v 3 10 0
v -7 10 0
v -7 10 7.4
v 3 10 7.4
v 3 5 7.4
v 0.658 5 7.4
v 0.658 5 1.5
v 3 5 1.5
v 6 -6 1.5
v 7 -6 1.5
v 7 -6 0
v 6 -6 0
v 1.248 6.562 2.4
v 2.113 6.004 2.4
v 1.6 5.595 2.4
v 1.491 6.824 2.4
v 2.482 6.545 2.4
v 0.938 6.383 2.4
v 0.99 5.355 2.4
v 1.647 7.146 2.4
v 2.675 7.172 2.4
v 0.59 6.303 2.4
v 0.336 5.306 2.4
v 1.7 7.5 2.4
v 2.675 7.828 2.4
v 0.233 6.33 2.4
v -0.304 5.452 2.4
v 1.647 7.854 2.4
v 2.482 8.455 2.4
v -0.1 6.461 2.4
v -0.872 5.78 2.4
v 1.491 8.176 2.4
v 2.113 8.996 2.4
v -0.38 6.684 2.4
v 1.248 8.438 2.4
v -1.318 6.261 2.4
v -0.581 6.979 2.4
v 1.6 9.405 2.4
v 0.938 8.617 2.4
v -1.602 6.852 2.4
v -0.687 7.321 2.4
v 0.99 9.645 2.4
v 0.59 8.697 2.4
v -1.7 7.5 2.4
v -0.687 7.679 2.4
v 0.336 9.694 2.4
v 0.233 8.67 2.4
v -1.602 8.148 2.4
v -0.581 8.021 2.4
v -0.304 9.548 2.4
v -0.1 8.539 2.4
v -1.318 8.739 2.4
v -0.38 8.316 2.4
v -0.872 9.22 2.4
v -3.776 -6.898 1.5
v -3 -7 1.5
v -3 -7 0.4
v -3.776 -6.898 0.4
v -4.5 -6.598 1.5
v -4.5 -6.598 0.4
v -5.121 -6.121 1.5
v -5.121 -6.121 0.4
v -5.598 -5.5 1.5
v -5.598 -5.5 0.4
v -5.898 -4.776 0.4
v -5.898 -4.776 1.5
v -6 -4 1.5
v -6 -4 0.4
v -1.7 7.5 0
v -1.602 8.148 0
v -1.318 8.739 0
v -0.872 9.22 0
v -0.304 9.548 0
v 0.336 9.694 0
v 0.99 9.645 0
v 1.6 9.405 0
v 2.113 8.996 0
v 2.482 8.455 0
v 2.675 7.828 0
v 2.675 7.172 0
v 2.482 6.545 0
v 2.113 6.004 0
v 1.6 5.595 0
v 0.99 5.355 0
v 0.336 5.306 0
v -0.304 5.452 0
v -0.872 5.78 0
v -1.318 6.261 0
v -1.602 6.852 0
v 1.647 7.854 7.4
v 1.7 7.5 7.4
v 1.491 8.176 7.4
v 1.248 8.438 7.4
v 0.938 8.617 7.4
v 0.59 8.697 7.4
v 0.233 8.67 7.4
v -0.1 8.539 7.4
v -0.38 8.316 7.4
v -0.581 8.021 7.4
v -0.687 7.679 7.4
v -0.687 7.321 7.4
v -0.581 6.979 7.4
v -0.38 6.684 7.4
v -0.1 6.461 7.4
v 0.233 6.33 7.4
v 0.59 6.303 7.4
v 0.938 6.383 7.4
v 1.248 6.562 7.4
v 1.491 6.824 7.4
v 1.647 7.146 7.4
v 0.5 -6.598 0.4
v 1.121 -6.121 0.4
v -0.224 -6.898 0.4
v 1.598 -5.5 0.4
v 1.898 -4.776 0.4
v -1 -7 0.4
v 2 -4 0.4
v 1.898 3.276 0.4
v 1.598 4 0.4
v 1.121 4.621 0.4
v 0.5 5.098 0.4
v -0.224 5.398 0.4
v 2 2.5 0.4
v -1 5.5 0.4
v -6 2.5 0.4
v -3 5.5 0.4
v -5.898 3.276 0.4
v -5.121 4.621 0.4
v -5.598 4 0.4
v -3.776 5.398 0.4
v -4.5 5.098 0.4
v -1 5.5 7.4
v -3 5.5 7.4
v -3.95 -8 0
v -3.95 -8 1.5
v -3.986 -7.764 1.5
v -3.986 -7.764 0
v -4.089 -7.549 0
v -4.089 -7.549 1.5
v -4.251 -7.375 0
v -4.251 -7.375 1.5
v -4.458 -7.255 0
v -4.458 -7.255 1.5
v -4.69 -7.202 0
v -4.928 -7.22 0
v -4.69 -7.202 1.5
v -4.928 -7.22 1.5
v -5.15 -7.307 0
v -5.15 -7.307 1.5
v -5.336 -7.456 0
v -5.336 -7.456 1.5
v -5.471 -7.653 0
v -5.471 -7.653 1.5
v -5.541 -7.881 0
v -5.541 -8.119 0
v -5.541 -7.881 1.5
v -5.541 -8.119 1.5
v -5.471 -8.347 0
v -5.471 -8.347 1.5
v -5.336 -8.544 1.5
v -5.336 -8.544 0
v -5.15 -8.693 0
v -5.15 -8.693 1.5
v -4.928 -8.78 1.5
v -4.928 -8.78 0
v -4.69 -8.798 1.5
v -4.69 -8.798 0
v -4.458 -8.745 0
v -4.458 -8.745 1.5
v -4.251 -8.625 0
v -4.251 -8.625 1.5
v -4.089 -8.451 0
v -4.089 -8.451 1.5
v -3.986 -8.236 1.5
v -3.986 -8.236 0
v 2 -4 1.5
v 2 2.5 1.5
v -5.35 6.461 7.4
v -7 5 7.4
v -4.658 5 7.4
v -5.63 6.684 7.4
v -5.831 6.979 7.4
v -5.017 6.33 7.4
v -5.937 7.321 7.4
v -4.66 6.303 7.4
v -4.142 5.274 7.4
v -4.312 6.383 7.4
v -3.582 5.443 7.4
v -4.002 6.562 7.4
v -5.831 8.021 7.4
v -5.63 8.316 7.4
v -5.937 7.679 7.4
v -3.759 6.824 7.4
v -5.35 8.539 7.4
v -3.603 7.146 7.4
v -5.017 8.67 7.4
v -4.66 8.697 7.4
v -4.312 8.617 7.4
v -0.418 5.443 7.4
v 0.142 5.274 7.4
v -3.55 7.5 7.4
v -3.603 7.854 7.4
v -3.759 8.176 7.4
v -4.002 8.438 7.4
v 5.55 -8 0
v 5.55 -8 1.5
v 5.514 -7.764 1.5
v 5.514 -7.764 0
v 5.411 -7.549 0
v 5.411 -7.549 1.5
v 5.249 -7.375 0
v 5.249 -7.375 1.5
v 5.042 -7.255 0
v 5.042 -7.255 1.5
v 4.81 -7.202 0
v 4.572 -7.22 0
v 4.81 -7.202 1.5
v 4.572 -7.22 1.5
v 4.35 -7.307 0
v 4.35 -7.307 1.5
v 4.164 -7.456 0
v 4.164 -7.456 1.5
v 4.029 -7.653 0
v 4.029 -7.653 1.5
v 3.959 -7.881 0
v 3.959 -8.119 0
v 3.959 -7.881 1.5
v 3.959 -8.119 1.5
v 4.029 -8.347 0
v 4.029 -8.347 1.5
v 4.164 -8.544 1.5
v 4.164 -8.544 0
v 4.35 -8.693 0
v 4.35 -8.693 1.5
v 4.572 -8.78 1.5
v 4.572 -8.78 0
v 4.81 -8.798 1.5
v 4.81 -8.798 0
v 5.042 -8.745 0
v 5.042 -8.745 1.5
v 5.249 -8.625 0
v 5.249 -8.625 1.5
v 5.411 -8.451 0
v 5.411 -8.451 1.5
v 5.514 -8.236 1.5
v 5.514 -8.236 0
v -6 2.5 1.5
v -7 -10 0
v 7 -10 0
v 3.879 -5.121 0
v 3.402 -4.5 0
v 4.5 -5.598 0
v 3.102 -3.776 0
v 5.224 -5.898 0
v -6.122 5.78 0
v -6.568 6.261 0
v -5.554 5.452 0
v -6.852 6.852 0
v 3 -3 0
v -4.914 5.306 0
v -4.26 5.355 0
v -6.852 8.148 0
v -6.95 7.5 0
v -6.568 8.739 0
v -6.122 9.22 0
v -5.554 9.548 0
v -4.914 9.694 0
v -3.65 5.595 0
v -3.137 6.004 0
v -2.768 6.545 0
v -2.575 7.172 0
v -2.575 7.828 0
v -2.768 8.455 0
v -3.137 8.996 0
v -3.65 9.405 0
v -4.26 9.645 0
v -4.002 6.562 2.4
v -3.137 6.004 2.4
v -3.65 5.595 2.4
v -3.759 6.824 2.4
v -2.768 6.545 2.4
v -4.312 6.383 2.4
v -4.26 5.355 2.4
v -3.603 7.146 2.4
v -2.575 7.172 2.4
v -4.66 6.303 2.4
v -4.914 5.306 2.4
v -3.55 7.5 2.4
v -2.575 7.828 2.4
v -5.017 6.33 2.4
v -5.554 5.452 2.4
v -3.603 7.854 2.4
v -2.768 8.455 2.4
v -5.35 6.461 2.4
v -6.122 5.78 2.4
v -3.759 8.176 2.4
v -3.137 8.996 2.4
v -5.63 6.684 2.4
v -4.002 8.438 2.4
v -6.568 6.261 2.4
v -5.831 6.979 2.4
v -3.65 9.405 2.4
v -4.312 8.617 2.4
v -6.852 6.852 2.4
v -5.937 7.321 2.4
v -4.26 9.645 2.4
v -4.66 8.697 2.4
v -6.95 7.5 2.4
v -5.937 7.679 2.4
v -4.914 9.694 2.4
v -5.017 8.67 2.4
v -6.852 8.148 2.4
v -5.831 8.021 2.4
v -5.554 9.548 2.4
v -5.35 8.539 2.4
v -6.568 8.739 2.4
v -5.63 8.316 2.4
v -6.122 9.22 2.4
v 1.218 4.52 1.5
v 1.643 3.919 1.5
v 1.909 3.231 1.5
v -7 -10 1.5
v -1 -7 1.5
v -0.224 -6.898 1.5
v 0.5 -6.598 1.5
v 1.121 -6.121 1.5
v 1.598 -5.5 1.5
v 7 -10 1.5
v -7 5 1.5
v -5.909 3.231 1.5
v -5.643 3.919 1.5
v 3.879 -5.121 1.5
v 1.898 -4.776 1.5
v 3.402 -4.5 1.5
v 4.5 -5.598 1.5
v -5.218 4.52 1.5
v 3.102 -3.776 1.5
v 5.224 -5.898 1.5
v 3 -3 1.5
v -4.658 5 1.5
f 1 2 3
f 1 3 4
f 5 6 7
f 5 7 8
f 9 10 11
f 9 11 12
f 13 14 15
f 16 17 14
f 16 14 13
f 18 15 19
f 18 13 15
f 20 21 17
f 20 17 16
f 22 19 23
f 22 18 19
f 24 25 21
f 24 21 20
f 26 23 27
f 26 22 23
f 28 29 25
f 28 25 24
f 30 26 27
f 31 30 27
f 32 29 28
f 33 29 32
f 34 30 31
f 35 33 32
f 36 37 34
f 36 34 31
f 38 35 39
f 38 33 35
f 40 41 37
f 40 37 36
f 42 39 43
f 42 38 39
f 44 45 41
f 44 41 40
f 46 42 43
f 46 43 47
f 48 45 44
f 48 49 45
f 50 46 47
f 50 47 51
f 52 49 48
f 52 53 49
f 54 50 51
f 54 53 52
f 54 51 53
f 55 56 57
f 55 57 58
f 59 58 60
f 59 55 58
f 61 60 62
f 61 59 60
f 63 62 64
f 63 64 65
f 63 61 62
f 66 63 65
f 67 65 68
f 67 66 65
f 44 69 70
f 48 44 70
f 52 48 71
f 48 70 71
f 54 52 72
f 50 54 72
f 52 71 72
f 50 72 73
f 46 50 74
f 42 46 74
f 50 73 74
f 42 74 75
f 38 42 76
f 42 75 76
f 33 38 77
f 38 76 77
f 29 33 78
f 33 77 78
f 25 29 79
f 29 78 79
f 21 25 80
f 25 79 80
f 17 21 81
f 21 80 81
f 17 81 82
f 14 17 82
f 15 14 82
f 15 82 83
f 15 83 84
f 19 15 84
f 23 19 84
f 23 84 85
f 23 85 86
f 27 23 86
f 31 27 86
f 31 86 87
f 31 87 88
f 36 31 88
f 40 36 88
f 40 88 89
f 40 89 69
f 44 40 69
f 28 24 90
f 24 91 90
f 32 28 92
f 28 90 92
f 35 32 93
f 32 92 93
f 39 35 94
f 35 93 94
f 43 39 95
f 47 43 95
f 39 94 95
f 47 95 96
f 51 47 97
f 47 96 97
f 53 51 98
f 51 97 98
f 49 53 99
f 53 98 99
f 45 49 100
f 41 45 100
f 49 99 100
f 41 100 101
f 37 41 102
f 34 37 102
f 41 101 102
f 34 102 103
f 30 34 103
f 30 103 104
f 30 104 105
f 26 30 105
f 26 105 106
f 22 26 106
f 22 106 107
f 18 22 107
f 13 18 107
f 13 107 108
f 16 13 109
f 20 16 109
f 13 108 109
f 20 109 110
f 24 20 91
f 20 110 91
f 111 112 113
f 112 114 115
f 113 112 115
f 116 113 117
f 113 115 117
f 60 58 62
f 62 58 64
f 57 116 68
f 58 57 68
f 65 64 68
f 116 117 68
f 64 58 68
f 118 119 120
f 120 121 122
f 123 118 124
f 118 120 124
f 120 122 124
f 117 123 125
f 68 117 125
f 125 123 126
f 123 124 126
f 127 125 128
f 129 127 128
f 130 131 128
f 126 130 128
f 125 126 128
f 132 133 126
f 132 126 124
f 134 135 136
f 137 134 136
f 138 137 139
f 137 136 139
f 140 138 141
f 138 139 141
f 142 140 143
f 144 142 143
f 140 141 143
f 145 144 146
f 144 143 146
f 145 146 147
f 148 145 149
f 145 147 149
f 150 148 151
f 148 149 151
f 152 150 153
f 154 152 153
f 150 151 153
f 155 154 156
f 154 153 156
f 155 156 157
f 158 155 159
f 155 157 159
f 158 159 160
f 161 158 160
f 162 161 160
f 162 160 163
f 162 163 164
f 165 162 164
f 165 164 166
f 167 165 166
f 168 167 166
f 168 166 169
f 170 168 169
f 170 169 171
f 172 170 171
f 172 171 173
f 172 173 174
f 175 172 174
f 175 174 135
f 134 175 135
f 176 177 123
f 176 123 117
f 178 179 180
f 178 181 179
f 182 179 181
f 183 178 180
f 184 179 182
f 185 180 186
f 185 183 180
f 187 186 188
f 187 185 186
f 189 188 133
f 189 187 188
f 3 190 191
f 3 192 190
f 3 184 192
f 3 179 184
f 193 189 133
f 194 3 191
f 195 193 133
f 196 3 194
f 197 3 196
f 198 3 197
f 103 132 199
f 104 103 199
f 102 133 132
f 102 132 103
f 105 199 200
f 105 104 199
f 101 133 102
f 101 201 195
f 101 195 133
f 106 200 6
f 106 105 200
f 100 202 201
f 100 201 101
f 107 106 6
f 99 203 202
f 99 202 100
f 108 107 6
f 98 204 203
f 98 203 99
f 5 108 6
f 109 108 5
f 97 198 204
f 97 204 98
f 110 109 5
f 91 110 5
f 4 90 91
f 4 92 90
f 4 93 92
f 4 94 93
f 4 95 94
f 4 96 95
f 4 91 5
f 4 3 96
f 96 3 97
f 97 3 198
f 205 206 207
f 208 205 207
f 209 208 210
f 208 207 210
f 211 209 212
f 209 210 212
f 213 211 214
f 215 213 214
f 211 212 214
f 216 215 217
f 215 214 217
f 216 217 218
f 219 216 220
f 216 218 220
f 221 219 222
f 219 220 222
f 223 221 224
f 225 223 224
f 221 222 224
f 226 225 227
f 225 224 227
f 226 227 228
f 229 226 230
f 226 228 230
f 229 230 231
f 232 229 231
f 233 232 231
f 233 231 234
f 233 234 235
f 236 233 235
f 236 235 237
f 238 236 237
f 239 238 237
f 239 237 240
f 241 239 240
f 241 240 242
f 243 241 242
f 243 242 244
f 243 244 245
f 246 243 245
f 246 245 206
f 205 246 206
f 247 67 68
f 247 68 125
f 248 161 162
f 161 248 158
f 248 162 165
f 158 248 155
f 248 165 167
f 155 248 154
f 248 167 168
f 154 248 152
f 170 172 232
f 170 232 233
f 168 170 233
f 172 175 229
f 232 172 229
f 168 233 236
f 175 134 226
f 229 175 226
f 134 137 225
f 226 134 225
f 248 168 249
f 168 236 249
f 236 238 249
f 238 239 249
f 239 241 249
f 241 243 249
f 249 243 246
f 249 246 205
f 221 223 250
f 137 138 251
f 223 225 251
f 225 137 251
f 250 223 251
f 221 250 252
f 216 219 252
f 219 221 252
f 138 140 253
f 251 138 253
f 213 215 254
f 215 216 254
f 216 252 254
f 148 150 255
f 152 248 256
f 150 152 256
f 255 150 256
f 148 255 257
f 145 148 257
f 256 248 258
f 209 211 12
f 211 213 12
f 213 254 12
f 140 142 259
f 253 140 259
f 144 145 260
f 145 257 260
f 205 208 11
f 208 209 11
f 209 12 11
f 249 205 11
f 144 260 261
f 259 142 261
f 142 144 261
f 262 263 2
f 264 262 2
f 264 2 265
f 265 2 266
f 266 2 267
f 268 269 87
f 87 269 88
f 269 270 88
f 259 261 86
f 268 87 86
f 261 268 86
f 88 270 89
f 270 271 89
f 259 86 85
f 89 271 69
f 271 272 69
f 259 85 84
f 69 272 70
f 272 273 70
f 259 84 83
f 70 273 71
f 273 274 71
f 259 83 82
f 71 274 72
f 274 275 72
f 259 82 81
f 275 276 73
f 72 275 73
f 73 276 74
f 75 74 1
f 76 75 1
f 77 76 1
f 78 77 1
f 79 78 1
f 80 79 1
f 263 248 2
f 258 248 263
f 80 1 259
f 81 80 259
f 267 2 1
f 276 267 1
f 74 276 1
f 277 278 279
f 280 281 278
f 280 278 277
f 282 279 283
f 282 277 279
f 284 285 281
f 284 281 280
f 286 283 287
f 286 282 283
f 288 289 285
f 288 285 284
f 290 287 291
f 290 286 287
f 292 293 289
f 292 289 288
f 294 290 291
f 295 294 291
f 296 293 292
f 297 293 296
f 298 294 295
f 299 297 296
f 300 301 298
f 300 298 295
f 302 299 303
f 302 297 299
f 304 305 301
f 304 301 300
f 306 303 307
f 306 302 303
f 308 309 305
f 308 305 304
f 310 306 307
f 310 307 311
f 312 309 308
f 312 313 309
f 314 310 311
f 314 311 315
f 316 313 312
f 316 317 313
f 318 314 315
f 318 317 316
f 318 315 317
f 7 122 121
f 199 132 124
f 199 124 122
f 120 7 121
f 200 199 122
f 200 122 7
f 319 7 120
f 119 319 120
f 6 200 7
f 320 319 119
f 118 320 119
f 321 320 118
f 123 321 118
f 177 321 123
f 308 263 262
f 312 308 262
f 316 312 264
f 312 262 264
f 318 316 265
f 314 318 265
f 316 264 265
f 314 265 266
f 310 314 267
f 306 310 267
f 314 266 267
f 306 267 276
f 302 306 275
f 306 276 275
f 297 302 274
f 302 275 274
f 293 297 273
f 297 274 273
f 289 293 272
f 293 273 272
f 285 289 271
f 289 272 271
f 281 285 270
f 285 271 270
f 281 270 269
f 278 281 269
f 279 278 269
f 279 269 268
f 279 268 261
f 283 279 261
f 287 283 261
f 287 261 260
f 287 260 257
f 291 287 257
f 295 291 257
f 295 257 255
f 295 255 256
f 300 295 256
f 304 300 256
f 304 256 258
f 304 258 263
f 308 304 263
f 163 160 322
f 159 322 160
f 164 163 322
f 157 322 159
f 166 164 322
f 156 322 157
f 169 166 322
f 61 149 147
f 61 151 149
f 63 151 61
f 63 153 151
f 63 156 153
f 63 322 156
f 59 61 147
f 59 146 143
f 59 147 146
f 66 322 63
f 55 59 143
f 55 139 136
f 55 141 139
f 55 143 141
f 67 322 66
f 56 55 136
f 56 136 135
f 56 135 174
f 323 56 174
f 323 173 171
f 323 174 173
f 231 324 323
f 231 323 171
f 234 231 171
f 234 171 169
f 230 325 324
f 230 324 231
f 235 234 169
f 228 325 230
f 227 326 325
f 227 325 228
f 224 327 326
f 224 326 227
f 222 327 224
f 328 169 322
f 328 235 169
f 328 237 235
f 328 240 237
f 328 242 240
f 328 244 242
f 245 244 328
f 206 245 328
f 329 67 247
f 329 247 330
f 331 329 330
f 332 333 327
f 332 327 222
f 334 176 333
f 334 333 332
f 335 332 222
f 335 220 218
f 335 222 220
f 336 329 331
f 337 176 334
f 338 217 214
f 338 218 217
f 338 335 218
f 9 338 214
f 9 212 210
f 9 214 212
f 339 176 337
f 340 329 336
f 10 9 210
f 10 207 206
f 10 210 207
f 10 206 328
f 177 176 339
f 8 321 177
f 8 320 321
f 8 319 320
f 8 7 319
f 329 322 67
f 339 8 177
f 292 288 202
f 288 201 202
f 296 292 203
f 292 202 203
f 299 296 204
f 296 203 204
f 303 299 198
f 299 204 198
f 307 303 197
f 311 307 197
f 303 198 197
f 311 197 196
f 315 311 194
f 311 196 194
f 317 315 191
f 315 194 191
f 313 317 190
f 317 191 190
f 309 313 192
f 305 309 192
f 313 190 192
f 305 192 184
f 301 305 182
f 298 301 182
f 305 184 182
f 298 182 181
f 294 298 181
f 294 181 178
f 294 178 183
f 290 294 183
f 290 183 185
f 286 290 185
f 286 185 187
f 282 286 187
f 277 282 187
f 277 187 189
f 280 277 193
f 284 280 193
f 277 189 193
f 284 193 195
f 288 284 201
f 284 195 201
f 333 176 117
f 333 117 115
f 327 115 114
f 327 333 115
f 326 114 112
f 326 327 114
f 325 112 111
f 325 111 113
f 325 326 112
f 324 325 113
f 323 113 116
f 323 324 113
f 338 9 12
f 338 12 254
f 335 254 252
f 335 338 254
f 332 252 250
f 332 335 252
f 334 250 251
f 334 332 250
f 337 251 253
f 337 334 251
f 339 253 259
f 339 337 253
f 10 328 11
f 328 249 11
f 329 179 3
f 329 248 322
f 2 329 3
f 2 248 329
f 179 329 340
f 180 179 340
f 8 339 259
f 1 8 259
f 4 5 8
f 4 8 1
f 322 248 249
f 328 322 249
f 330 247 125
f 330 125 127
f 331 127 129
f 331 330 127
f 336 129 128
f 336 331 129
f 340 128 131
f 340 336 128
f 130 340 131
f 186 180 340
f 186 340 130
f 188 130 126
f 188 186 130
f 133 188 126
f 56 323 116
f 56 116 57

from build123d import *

# Parameters (mm, degrees)
SKETCH1_W                                           = 14
SKETCH1_H                                           = 20
BOSS_EXTRUDE1_DEPTH                                 = 1.5
SKETCH2_W                                           = 14
SKETCH2_H                                           = 5
BOSS_EXTRUDE2_DEPTH                                 = 5.9
M2_TAPPED_HOLE1_D                                   = 1.6
M2_TAPPED_HOLE1_DEPTH                               = 6
M2_TAPPED_HOLE1_TIP                                 = 0.480688495
CUT_EXTRUDE6_DEPTH                                  = 15.274452704
CBORE_FOR_M2_HEX_SOCKET_HEAD_CAP_SCREW1_D           = 2.4
CBORE_FOR_M2_HEX_SOCKET_HEAD_CAP_SCREW1_DEPTH       = 7.5
CBORE_FOR_M2_HEX_SOCKET_HEAD_CAP_SCREW1_CBORE_D     = 4.4
CBORE_FOR_M2_HEX_SOCKET_HEAD_CAP_SCREW1_CBORE_DEPTH = 2.4
CBORE_FOR_M2_HEX_SOCKET_HEAD_CAP_SCREW1_TIP         = 0.721032743
CUT_EXTRUDE7_DEPTH                                  = 7


with BuildPart() as part:
    # Sketch1 → Boss-Extrude1 (new body)
    with BuildSketch(Plane.XY):
        Rectangle(SKETCH1_W, SKETCH1_H)
    extrude(amount=BOSS_EXTRUDE1_DEPTH)

    # Sketch2 → Boss-Extrude2 (add)
    with BuildSketch(Plane.XY.offset(1.5)):
        with Locations((0, 7.5)):
            Rectangle(SKETCH2_W, SKETCH2_H)
    extrude(amount=BOSS_EXTRUDE2_DEPTH)

    # M2 Tapped Hole1
    with Locations(Plane(origin=(-4.75, -8, 0), x_dir=(-1, 0, 0), z_dir=(0, 0, -1))):
        with Locations((0, 0), (-9.5, 0)):
            Hole(M2_TAPPED_HOLE1_D / 2, depth=M2_TAPPED_HOLE1_DEPTH)
            with Locations((0, 0, -(M2_TAPPED_HOLE1_DEPTH + M2_TAPPED_HOLE1_TIP / 2))):  # 118° drill point
                Cone(0, M2_TAPPED_HOLE1_D / 2, M2_TAPPED_HOLE1_TIP, mode=Mode.SUBTRACT)

    # Sketch11 → Cut-Extrude6 (cut, through all)
    with BuildSketch(Plane.XY.offset(7.4)):
        with BuildLine():
            Line((7, -6), (6, -6))
            ThreePointArc((6, -6), (3.878679656, -5.121320344), (3, -3))
            Line((3, -3), (3, 10))
            Line((3, 10), (7, 10))
            Line((7, 10), (7, -6))
        make_face()
    extrude(amount=-CUT_EXTRUDE6_DEPTH, mode=Mode.SUBTRACT)

    # CBORE for M2 Hex Socket Head Cap Screw1
    with Locations(Plane(origin=(-4.75, 7.5, 0), x_dir=(-1, 0, 0), z_dir=(0, 0, -1))):
        with Locations((0, 0), (-5.25, 0)):
            CounterBoreHole(CBORE_FOR_M2_HEX_SOCKET_HEAD_CAP_SCREW1_D / 2, CBORE_FOR_M2_HEX_SOCKET_HEAD_CAP_SCREW1_CBORE_D / 2, CBORE_FOR_M2_HEX_SOCKET_HEAD_CAP_SCREW1_CBORE_DEPTH, depth=CBORE_FOR_M2_HEX_SOCKET_HEAD_CAP_SCREW1_DEPTH)
            with Locations((0, 0, -(CBORE_FOR_M2_HEX_SOCKET_HEAD_CAP_SCREW1_DEPTH + CBORE_FOR_M2_HEX_SOCKET_HEAD_CAP_SCREW1_TIP / 2))):  # 118° drill point
                Cone(0, CBORE_FOR_M2_HEX_SOCKET_HEAD_CAP_SCREW1_D / 2, CBORE_FOR_M2_HEX_SOCKET_HEAD_CAP_SCREW1_TIP, mode=Mode.SUBTRACT)

    # Sketch14 → Cut-Extrude7 (cut)
    with BuildSketch(Plane.XY.offset(7.4)):
        with BuildLine():
            Line((-3, 5.5), (-1, 5.5))
            ThreePointArc((-1, 5.5), (1.121320344, 4.621320344), (2, 2.5))
            Line((2, 2.5), (2, -4))
            ThreePointArc((2, -4), (1.121320344, -6.121320344), (-1, -7))
            Line((-1, -7), (-3, -7))
            ThreePointArc((-3, -7), (-5.121320344, -6.121320344), (-6, -4))
            Line((-6, -4), (-6, 2.5))
            ThreePointArc((-6, 2.5), (-5.121320344, 4.621320344), (-3, 5.5))
        make_face()
    extrude(amount=-CUT_EXTRUDE7_DEPTH, mode=Mode.SUBTRACT)


solid = part.part
